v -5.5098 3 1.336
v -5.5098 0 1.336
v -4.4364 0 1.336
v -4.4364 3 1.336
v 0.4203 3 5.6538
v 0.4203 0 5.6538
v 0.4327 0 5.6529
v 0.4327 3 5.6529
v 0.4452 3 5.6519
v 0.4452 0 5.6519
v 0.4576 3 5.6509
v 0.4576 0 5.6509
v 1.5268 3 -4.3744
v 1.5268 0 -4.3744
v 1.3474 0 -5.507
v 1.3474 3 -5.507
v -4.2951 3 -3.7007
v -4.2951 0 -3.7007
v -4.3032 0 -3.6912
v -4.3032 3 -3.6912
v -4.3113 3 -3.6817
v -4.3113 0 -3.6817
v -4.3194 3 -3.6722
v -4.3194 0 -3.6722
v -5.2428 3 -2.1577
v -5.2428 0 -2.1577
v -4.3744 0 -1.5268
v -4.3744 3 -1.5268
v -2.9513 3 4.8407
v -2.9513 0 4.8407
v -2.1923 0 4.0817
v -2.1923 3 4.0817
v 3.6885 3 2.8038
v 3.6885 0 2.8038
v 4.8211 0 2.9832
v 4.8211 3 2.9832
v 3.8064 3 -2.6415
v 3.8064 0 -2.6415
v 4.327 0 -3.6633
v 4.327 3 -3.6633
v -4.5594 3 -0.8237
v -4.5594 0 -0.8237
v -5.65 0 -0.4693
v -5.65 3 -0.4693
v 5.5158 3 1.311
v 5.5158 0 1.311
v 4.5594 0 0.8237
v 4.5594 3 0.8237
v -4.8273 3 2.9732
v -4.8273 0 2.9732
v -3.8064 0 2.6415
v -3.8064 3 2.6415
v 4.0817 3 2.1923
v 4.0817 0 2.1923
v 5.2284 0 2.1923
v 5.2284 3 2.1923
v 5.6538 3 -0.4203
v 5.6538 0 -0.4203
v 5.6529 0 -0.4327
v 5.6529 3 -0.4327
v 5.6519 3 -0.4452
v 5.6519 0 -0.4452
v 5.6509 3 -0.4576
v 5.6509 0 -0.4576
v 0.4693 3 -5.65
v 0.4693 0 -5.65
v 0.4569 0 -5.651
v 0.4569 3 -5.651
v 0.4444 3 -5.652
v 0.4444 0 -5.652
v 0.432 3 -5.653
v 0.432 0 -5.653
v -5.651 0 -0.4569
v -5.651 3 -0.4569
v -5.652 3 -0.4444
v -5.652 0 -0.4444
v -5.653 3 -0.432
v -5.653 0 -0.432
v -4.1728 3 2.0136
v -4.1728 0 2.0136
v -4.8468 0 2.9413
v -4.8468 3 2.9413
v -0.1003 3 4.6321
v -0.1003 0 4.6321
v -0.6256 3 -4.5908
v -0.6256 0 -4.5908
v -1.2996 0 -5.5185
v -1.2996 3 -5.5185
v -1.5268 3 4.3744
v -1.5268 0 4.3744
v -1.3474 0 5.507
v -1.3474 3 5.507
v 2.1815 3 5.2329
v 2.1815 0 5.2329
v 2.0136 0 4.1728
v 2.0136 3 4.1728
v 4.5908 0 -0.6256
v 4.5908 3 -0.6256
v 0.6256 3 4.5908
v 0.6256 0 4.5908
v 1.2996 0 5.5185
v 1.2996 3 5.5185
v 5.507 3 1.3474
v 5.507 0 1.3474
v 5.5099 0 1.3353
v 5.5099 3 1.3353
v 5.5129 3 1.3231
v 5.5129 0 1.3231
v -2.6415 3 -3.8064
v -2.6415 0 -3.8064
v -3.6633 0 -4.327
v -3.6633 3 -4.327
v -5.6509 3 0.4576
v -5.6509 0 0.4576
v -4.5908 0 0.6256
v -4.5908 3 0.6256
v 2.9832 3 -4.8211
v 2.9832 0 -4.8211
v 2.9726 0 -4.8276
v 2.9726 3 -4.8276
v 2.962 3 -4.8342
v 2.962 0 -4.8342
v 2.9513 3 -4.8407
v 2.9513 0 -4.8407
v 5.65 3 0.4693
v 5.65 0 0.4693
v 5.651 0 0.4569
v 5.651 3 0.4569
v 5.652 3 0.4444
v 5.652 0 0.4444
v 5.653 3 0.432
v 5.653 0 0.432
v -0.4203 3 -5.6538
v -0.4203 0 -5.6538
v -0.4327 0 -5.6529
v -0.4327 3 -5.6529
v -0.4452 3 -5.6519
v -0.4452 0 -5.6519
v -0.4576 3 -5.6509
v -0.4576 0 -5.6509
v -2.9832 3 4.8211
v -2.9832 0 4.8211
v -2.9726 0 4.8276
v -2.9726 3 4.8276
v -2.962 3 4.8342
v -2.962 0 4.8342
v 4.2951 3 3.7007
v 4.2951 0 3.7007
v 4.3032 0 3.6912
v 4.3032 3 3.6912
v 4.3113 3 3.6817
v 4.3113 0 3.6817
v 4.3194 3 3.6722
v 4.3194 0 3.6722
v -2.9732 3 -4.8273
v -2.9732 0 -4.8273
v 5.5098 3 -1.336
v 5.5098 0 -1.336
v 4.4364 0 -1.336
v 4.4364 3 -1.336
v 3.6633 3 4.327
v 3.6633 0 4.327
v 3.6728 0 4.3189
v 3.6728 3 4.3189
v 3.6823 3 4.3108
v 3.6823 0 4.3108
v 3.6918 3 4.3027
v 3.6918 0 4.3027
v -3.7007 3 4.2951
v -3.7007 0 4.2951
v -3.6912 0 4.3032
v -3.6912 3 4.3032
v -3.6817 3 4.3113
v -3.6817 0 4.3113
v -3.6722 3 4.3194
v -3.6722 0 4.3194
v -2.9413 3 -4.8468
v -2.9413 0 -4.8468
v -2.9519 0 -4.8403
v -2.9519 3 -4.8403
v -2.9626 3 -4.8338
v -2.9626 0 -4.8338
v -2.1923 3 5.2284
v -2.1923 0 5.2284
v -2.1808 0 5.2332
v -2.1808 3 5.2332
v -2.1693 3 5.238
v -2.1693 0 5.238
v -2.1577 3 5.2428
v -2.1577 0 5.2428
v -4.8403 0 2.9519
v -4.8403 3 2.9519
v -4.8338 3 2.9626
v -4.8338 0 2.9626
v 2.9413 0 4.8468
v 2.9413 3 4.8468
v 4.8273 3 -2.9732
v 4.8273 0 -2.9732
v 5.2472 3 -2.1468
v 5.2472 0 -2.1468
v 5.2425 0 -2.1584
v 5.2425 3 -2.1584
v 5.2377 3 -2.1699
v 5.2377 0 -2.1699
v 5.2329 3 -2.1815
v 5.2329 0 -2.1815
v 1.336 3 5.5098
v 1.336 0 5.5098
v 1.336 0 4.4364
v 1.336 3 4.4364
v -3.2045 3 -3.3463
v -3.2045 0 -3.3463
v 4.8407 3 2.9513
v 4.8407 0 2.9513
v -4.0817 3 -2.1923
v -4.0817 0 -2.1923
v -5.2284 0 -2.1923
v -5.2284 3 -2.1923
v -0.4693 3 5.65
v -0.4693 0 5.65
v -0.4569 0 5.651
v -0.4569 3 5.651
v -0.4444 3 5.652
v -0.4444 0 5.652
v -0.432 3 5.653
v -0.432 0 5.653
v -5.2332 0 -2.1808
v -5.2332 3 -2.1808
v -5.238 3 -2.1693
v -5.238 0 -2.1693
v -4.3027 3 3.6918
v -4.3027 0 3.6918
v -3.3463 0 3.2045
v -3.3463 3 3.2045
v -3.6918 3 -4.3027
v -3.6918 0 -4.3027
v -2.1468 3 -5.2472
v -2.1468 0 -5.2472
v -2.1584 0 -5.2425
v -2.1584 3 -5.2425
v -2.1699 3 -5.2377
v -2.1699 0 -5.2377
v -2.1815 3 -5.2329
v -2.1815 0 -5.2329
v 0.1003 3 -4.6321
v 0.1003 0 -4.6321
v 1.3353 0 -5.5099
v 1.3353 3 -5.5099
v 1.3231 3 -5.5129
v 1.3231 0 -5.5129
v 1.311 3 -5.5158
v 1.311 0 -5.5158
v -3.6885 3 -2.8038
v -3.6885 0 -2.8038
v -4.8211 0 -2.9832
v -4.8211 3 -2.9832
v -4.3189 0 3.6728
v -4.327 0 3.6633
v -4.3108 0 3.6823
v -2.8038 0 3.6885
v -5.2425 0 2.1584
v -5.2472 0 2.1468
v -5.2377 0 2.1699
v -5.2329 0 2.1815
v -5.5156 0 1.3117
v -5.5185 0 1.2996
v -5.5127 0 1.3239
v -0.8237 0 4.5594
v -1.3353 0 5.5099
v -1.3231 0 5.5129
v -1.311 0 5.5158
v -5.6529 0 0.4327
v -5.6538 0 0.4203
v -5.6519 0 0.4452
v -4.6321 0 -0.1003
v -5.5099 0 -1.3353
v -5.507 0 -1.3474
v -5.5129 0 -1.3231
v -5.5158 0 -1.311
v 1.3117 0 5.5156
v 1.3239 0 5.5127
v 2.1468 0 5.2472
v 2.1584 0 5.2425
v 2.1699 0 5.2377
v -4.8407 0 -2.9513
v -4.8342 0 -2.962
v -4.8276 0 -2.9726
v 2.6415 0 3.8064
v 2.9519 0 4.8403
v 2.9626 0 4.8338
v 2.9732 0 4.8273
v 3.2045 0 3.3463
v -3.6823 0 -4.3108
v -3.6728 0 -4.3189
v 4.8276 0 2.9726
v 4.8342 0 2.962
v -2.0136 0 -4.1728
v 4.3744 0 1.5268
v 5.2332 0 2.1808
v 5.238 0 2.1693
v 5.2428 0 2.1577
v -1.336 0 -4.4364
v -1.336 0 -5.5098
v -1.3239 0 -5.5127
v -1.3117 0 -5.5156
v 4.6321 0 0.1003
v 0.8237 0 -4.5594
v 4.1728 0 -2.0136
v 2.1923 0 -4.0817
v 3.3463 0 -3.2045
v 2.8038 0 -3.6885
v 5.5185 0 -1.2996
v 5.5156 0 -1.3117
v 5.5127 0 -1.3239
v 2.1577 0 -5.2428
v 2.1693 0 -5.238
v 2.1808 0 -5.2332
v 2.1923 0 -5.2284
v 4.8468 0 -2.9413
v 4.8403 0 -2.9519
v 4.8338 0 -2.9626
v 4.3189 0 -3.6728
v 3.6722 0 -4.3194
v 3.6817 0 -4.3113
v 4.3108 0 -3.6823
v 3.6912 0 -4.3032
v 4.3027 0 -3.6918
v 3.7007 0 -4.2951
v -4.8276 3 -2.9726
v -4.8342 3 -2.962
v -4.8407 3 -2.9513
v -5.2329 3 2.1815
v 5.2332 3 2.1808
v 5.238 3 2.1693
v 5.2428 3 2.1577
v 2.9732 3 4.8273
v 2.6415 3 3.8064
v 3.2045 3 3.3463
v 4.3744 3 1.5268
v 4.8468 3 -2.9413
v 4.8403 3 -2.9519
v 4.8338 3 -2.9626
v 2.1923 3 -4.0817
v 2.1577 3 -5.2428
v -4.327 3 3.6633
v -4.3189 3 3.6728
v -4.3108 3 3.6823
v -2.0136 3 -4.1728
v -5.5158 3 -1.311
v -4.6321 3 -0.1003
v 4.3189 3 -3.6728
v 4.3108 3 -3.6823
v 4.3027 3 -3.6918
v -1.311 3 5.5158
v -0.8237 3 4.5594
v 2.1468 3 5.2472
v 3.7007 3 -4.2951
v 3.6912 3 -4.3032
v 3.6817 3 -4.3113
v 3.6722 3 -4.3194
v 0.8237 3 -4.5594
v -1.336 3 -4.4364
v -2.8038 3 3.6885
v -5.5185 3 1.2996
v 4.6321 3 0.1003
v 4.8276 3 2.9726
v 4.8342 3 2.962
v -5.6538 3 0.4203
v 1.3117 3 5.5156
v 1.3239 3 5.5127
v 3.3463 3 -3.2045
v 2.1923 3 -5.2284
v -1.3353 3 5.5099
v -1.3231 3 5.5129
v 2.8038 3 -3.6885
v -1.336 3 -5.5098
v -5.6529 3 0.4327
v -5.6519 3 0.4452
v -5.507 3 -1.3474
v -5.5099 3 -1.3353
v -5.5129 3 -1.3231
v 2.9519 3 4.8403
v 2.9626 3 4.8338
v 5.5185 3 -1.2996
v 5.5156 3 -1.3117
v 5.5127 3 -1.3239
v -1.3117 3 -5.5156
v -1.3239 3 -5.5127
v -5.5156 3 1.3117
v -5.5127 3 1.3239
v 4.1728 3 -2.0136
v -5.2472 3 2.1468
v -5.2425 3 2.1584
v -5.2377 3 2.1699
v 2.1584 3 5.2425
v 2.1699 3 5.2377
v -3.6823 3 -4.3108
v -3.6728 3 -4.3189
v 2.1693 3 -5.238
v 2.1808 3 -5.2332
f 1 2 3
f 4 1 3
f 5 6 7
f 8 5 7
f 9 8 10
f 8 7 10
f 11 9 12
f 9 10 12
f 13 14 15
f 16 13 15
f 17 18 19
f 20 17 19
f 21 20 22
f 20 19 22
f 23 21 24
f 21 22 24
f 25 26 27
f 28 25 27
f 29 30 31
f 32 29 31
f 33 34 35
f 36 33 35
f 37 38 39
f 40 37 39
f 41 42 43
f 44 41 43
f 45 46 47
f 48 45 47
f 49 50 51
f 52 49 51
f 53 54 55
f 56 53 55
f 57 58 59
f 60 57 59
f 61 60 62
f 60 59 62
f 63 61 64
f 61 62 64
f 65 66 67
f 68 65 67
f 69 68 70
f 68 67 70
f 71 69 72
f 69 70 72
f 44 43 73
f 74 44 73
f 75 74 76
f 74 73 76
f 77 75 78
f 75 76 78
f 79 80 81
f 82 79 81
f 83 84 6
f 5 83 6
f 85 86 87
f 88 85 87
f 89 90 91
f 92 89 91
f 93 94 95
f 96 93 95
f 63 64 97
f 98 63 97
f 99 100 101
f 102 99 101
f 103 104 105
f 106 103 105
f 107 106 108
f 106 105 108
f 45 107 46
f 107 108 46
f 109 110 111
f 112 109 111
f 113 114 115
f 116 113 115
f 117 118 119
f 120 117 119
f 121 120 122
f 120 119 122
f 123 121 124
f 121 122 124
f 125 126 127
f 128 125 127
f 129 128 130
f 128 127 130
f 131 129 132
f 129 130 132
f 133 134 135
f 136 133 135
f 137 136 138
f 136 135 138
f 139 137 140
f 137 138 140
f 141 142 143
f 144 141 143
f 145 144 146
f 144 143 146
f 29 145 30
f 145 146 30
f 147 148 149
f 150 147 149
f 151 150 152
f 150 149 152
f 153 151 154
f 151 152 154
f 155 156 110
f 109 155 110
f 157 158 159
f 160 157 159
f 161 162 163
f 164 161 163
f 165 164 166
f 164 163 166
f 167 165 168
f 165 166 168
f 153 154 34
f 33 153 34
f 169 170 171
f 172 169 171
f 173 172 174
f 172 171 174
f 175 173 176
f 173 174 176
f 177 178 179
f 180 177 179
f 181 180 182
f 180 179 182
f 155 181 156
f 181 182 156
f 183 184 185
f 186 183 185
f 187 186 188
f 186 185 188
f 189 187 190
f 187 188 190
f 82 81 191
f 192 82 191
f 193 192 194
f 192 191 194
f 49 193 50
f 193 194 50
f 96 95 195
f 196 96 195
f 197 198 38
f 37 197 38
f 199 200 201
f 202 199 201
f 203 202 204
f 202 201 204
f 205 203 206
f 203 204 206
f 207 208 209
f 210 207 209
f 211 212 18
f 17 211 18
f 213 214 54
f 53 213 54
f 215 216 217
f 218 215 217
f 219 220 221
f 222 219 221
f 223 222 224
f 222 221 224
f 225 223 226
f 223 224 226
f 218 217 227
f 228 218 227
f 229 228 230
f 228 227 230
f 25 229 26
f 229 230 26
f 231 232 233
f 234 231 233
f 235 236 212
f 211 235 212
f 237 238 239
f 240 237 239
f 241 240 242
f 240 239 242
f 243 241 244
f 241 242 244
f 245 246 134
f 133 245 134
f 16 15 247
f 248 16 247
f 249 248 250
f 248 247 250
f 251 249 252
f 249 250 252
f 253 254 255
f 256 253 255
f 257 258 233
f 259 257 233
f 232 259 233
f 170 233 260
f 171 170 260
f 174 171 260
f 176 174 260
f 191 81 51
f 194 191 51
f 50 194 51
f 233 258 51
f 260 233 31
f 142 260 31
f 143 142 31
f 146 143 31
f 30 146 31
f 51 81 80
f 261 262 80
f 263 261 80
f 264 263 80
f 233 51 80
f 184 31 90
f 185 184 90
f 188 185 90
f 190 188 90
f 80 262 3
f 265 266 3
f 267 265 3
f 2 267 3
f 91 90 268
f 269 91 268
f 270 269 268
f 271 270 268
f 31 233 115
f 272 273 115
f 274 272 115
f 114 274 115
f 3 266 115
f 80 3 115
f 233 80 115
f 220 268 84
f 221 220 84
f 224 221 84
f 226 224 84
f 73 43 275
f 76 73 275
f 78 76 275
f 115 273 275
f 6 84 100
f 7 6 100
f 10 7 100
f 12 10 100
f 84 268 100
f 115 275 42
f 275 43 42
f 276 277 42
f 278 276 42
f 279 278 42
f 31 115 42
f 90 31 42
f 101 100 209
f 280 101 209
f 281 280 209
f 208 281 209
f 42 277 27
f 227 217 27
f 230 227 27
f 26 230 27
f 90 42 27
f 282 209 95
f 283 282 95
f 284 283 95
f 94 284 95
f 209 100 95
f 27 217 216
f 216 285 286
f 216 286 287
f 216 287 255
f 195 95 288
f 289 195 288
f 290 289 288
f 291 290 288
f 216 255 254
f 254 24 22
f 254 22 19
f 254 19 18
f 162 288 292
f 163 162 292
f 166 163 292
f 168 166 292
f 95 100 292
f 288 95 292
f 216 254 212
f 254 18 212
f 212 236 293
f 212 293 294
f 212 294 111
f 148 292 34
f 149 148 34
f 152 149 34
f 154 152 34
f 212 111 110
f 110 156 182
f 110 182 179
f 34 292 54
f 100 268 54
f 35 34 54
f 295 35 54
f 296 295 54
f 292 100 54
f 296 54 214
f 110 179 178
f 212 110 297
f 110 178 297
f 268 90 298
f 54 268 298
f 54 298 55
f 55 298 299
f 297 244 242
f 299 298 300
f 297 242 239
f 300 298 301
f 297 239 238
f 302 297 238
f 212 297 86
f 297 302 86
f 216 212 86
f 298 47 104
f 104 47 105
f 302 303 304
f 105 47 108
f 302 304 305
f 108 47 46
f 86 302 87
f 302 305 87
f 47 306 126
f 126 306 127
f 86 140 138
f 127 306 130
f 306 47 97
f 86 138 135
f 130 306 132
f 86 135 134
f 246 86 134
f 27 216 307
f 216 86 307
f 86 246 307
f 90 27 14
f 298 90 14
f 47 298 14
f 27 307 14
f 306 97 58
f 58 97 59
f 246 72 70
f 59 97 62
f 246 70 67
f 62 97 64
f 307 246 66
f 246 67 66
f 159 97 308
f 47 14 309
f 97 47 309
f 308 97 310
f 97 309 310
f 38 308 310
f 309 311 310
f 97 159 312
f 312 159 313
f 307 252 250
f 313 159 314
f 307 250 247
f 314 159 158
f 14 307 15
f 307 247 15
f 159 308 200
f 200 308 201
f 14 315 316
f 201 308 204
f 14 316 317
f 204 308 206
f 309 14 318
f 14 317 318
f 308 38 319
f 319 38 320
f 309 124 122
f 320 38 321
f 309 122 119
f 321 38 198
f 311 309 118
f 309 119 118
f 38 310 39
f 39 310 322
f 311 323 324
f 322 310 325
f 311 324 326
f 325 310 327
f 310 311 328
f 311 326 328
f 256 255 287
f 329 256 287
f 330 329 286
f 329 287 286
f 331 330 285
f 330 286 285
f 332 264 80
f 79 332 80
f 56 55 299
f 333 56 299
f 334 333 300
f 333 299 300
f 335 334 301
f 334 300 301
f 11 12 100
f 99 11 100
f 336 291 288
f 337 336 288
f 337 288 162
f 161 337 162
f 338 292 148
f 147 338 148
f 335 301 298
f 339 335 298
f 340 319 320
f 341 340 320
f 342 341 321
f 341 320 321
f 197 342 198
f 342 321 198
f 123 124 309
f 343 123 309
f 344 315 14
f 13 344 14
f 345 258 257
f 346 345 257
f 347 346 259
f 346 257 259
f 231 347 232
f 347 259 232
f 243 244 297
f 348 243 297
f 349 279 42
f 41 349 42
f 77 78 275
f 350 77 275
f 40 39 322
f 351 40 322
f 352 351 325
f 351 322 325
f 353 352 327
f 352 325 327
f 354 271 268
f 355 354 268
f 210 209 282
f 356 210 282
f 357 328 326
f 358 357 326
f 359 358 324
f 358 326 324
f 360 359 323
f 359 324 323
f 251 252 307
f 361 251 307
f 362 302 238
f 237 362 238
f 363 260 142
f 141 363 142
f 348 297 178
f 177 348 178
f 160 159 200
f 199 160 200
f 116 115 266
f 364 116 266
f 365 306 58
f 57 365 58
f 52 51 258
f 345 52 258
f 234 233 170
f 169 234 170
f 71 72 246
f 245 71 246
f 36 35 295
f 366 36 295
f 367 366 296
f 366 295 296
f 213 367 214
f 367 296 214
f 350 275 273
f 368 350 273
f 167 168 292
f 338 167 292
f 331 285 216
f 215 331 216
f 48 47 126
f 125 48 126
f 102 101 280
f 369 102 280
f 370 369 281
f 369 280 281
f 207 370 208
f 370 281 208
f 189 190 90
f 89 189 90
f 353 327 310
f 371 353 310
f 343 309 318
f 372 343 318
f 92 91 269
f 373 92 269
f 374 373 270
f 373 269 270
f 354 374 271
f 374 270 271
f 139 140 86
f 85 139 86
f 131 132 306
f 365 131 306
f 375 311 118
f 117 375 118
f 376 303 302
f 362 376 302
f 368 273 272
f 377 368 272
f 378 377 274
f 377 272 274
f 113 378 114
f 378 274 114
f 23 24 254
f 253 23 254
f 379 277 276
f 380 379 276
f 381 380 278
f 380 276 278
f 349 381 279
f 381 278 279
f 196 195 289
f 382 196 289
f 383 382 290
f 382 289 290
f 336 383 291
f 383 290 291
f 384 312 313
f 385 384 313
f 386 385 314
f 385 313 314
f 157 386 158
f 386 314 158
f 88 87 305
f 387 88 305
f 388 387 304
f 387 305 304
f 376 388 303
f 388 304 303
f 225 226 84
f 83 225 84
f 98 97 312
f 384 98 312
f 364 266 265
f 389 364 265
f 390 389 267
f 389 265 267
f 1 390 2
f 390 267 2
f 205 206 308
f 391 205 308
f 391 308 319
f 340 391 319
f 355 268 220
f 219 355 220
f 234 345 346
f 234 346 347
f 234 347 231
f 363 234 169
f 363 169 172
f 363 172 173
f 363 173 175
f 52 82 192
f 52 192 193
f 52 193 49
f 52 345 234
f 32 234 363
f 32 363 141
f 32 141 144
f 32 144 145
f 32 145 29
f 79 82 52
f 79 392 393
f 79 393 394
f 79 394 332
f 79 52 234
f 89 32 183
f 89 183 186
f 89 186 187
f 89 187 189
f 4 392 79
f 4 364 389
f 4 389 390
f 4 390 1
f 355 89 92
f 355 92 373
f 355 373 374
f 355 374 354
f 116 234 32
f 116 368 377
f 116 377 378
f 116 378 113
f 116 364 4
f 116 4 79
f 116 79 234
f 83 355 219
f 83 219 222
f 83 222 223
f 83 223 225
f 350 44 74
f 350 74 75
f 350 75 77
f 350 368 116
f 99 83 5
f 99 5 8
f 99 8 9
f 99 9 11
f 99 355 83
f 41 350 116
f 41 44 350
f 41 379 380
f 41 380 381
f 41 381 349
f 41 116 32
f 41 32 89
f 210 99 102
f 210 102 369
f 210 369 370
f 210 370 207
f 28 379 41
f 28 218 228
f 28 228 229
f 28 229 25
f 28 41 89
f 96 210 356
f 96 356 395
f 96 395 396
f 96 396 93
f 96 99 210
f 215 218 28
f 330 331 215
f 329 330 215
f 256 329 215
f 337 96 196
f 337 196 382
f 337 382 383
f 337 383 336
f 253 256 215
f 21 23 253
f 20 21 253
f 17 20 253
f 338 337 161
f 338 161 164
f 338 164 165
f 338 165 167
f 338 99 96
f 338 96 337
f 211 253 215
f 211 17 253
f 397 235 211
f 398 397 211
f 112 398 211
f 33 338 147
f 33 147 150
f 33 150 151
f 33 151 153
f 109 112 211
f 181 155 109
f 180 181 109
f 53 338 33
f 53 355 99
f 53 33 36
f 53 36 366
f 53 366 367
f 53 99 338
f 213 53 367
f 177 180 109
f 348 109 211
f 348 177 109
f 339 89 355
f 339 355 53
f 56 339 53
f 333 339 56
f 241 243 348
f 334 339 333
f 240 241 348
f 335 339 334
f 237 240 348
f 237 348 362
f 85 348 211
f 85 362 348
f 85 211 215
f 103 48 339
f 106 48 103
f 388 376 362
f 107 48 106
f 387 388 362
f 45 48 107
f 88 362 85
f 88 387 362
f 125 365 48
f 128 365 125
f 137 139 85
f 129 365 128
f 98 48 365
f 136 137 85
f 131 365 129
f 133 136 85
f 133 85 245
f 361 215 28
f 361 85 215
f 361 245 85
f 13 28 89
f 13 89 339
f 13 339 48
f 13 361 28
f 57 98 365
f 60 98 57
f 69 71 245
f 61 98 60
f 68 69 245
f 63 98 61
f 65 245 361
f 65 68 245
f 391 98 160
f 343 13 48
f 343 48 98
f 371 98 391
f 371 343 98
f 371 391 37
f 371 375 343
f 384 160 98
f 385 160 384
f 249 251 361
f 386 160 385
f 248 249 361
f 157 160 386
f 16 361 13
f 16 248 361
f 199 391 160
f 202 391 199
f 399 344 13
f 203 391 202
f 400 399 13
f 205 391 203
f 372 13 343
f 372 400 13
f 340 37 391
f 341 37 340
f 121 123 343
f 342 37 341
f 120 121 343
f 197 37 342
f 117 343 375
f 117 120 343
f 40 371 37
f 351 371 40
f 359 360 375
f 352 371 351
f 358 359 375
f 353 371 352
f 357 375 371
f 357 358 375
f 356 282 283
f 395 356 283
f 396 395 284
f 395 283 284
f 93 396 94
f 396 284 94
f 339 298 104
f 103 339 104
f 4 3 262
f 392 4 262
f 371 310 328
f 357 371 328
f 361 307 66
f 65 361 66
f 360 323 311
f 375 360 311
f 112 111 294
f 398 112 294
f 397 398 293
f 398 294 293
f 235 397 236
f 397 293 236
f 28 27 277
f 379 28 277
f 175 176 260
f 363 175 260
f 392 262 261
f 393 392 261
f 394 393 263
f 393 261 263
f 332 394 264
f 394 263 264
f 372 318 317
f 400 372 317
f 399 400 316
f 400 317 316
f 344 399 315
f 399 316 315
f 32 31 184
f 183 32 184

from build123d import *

# Parameters (mm, degrees)
Y_KSEKLIK_EKSTR_ZYON1_DEPTH = 3


with BuildPart() as part:
    # Çizim1 → Yükseklik-Ekstrüzyon1 (new body)
    with BuildSketch(Plane(origin=(0, 0, 0), x_dir=(1, 0, 0), z_dir=(0, 1, 0))):
        with BuildLine():
            Line((-1.336008246, 4.436405178), (-2.146846221, 5.247243153))
            ThreePointArc((-2.146846221, 5.247243153), (-2.164173955, 5.240120274), (-2.181478058, 5.232940176))
            Line((-2.181478058, 5.232940176), (-2.013566438, 4.172787933))
            Line((-2.013566438, 4.172787933), (-2.941264657, 4.846800142))
            ThreePointArc((-2.941264657, 4.846800142), (-2.957264794, 4.837054303), (-2.97323264, 4.827255646))
            Line((-2.97323264, 4.827255646), (-2.641543942, 3.806422801))
            Line((-2.641543942, 3.806422801), (-3.663259395, 4.327012826))
            ThreePointArc((-3.663259395, 4.327012826), (-3.67753796, 4.314884002), (-3.691776367, 4.302708061))
            Line((-3.691776367, 4.302708061), (-3.204477867, 3.346330906))
            Line((-3.204477867, 3.346330906), (-4.29505253, 3.700680094))
            ThreePointArc((-4.29505253, 3.700680094), (-4.307257936, 3.686466936), (-4.319416307, 3.672213524))
            Line((-4.319416307, 3.672213524), (-3.688506912, 2.803841239))
            Line((-3.688506912, 2.803841239), (-4.821087217, 2.983224337))
            ThreePointArc((-4.821087217, 2.983224337), (-4.830918926, 2.96727682), (-4.840697883, 2.951296902))
            Line((-4.840697883, 2.951296902), (-4.081712675, 2.192311695))
            Line((-4.081712675, 2.192311695), (-5.228410736, 2.192311695))
            ThreePointArc((-5.228410736, 2.192311695), (-5.23562666, 2.175022501), (-5.242785411, 2.157709556))
            Line((-5.242785411, 2.157709556), (-4.374413126, 1.526800161))
            Line((-4.374413126, 1.526800161), (-5.506993431, 1.347417063))
            ThreePointArc((-5.506993431, 1.347417063), (-5.511415889, 1.329211909), (-5.515778163, 1.31099224))
            Line((-5.515778163, 1.31099224), (-4.559401008, 0.82369374))
            Line((-4.559401008, 0.82369374), (-5.649975671, 0.469344552))
            ThreePointArc((-5.649975671, 0.469344552), (-5.651495767, 0.450671709), (-5.652954151, 0.431993944))
            Line((-5.652954151, 0.431993944), (-4.632121306, 0.100305246))
            Line((-4.632121306, 0.100305246), (-5.653836759, -0.42028478))
            ThreePointArc((-5.653836759, -0.42028478), (-5.652417064, -0.438965525), (-5.650935646, -0.457641477))
            Line((-5.650935646, -0.457641477), (-4.590783403, -0.625553097))
            Line((-4.590783403, -0.625553097), (-5.518481622, -1.299565306))
            ThreePointArc((-5.518481622, -1.299565306), (-5.514157093, -1.317793971), (-5.509772351, -1.336008246))
            Line((-5.509772351, -1.336008246), (-4.436405178, -1.336008246))
            Line((-4.436405178, -1.336008246), (-5.247243153, -2.146846221))
            ThreePointArc((-5.247243153, -2.146846221), (-5.240120274, -2.164173955), (-5.232940176, -2.181478058))
            Line((-5.232940176, -2.181478058), (-4.172787933, -2.013566438))
            Line((-4.172787933, -2.013566438), (-4.846800142, -2.941264657))
            ThreePointArc((-4.846800142, -2.941264657), (-4.837054303, -2.957264794), (-4.827255646, -2.97323264))
            Line((-4.827255646, -2.97323264), (-3.806422801, -2.641543942))
            Line((-3.806422801, -2.641543942), (-4.327012826, -3.663259395))
            ThreePointArc((-4.327012826, -3.663259395), (-4.314884002, -3.67753796), (-4.302708061, -3.691776367))
            Line((-4.302708061, -3.691776367), (-3.346330906, -3.204477867))
            Line((-3.346330906, -3.204477867), (-3.700680094, -4.29505253))
            ThreePointArc((-3.700680094, -4.29505253), (-3.686466936, -4.307257936), (-3.672213524, -4.319416307))
            Line((-3.672213524, -4.319416307), (-2.803841239, -3.688506912))
            Line((-2.803841239, -3.688506912), (-2.983224337, -4.821087217))
            ThreePointArc((-2.983224337, -4.821087217), (-2.96727682, -4.830918926), (-2.951296902, -4.840697883))
            Line((-2.951296902, -4.840697883), (-2.192311695, -4.081712675))
            Line((-2.192311695, -4.081712675), (-2.192311695, -5.228410736))
            ThreePointArc((-2.192311695, -5.228410736), (-2.175022501, -5.23562666), (-2.157709556, -5.242785411))
            Line((-2.157709556, -5.242785411), (-1.526800161, -4.374413126))
            Line((-1.526800161, -4.374413126), (-1.347417063, -5.506993431))
            ThreePointArc((-1.347417063, -5.506993431), (-1.329211909, -5.511415889), (-1.31099224, -5.515778163))
            Line((-1.31099224, -5.515778163), (-0.82369374, -4.559401008))
            Line((-0.82369374, -4.559401008), (-0.469344552, -5.649975671))
            ThreePointArc((-0.469344552, -5.649975671), (-0.450671709, -5.651495767), (-0.431993944, -5.652954151))
            Line((-0.431993944, -5.652954151), (-0.100305246, -4.632121306))
            Line((-0.100305246, -4.632121306), (0.42028478, -5.653836759))
            ThreePointArc((0.42028478, -5.653836759), (0.438965525, -5.652417064), (0.457641477, -5.650935646))
            Line((0.457641477, -5.650935646), (0.625553097, -4.590783403))
            Line((0.625553097, -4.590783403), (1.299565306, -5.518481622))
            ThreePointArc((1.299565306, -5.518481622), (1.317793971, -5.514157093), (1.336008246, -5.509772351))
            Line((1.336008246, -5.509772351), (1.336008246, -4.436405178))
            Line((1.336008246, -4.436405178), (2.146846221, -5.247243153))
            ThreePointArc((2.146846221, -5.247243153), (2.164173955, -5.240120274), (2.181478058, -5.232940176))
            Line((2.181478058, -5.232940176), (2.013566438, -4.172787933))
            Line((2.013566438, -4.172787933), (2.941264657, -4.846800142))
            ThreePointArc((2.941264657, -4.846800142), (2.957264794, -4.837054303), (2.97323264, -4.827255646))
            Line((2.97323264, -4.827255646), (2.641543942, -3.806422801))
            Line((2.641543942, -3.806422801), (3.663259395, -4.327012826))
            ThreePointArc((3.663259395, -4.327012826), (3.67753796, -4.314884002), (3.691776367, -4.302708061))
            Line((3.691776367, -4.302708061), (3.204477867, -3.346330906))
            Line((3.204477867, -3.346330906), (4.29505253, -3.700680094))
            ThreePointArc((4.29505253, -3.700680094), (4.307257936, -3.686466936), (4.319416307, -3.672213524))
            Line((4.319416307, -3.672213524), (3.688506912, -2.803841239))
            Line((3.688506912, -2.803841239), (4.821087217, -2.983224337))
            ThreePointArc((4.821087217, -2.983224337), (4.830918926, -2.96727682), (4.840697883, -2.951296902))
            Line((4.840697883, -2.951296902), (4.081712675, -2.192311695))
            Line((4.081712675, -2.192311695), (5.228410736, -2.192311695))
            ThreePointArc((5.228410736, -2.192311695), (5.23562666, -2.175022501), (5.242785411, -2.157709556))
            Line((5.242785411, -2.157709556), (4.374413126, -1.526800161))
            Line((4.374413126, -1.526800161), (5.506993431, -1.347417063))
            ThreePointArc((5.506993431, -1.347417063), (5.511415889, -1.329211909), (5.515778163, -1.31099224))
            Line((5.515778163, -1.31099224), (4.559401008, -0.82369374))
            Line((4.559401008, -0.82369374), (5.649975671, -0.469344552))
            ThreePointArc((5.649975671, -0.469344552), (5.651495767, -0.450671709), (5.652954151, -0.431993944))
            Line((5.652954151, -0.431993944), (4.632121306, -0.100305246))
            Line((4.632121306, -0.100305246), (5.653836759, 0.42028478))
            ThreePointArc((5.653836759, 0.42028478), (5.652417064, 0.438965525), (5.650935646, 0.457641477))
            Line((5.650935646, 0.457641477), (4.590783403, 0.625553097))
            Line((4.590783403, 0.625553097), (5.518481622, 1.299565306))
            ThreePointArc((5.518481622, 1.299565306), (5.514157093, 1.317793971), (5.509772351, 1.336008246))
            Line((5.509772351, 1.336008246), (4.436405178, 1.336008246))
            Line((4.436405178, 1.336008246), (5.247243153, 2.146846221))
            ThreePointArc((5.247243153, 2.146846221), (5.240120274, 2.164173955), (5.232940176, 2.181478058))
            Line((5.232940176, 2.181478058), (4.172787933, 2.013566438))
            Line((4.172787933, 2.013566438), (4.846800142, 2.941264657))
            ThreePointArc((4.846800142, 2.941264657), (4.837054303, 2.957264794), (4.827255646, 2.97323264))
            Line((4.827255646, 2.97323264), (3.806422801, 2.641543942))
            Line((3.806422801, 2.641543942), (4.327012826, 3.663259395))
            ThreePointArc((4.327012826, 3.663259395), (4.314884002, 3.67753796), (4.302708061, 3.691776367))
            Line((4.302708061, 3.691776367), (3.346330906, 3.204477867))
            Line((3.346330906, 3.204477867), (3.700680094, 4.29505253))
            ThreePointArc((3.700680094, 4.29505253), (3.686466936, 4.307257936), (3.672213524, 4.319416307))
            Line((3.672213524, 4.319416307), (2.803841239, 3.688506912))
            Line((2.803841239, 3.688506912), (2.983224337, 4.821087217))
            ThreePointArc((2.983224337, 4.821087217), (2.96727682, 4.830918926), (2.951296902, 4.840697883))
            Line((2.951296902, 4.840697883), (2.192311695, 4.081712675))
            Line((2.192311695, 4.081712675), (2.192311695, 5.228410736))
            ThreePointArc((2.192311695, 5.228410736), (2.175022501, 5.23562666), (2.157709556, 5.242785411))
            Line((2.157709556, 5.242785411), (1.526800161, 4.374413126))
            Line((1.526800161, 4.374413126), (1.347417063, 5.506993431))
            ThreePointArc((1.347417063, 5.506993431), (1.329211909, 5.511415889), (1.31099224, 5.515778163))
            Line((1.31099224, 5.515778163), (0.82369374, 4.559401008))
            Line((0.82369374, 4.559401008), (0.469344552, 5.649975671))
            ThreePointArc((0.469344552, 5.649975671), (0.450671709, 5.651495767), (0.431993944, 5.652954151))
            Line((0.431993944, 5.652954151), (0.100305246, 4.632121306))
            Line((0.100305246, 4.632121306), (-0.42028478, 5.653836759))
            ThreePointArc((-0.42028478, 5.653836759), (-0.438965525, 5.652417064), (-0.457641477, 5.650935646))
            Line((-0.457641477, 5.650935646), (-0.625553097, 4.590783403))
            Line((-0.625553097, 4.590783403), (-1.299565306, 5.518481622))
            ThreePointArc((-1.299565306, 5.518481622), (-1.317793971, 5.514157093), (-1.336008246, 5.509772351))
            Line((-1.336008246, 5.509772351), (-1.336008246, 4.436405178))
        make_face()
    extrude(amount=Y_KSEKLIK_EKSTR_ZYON1_DEPTH)


solid = part.part
